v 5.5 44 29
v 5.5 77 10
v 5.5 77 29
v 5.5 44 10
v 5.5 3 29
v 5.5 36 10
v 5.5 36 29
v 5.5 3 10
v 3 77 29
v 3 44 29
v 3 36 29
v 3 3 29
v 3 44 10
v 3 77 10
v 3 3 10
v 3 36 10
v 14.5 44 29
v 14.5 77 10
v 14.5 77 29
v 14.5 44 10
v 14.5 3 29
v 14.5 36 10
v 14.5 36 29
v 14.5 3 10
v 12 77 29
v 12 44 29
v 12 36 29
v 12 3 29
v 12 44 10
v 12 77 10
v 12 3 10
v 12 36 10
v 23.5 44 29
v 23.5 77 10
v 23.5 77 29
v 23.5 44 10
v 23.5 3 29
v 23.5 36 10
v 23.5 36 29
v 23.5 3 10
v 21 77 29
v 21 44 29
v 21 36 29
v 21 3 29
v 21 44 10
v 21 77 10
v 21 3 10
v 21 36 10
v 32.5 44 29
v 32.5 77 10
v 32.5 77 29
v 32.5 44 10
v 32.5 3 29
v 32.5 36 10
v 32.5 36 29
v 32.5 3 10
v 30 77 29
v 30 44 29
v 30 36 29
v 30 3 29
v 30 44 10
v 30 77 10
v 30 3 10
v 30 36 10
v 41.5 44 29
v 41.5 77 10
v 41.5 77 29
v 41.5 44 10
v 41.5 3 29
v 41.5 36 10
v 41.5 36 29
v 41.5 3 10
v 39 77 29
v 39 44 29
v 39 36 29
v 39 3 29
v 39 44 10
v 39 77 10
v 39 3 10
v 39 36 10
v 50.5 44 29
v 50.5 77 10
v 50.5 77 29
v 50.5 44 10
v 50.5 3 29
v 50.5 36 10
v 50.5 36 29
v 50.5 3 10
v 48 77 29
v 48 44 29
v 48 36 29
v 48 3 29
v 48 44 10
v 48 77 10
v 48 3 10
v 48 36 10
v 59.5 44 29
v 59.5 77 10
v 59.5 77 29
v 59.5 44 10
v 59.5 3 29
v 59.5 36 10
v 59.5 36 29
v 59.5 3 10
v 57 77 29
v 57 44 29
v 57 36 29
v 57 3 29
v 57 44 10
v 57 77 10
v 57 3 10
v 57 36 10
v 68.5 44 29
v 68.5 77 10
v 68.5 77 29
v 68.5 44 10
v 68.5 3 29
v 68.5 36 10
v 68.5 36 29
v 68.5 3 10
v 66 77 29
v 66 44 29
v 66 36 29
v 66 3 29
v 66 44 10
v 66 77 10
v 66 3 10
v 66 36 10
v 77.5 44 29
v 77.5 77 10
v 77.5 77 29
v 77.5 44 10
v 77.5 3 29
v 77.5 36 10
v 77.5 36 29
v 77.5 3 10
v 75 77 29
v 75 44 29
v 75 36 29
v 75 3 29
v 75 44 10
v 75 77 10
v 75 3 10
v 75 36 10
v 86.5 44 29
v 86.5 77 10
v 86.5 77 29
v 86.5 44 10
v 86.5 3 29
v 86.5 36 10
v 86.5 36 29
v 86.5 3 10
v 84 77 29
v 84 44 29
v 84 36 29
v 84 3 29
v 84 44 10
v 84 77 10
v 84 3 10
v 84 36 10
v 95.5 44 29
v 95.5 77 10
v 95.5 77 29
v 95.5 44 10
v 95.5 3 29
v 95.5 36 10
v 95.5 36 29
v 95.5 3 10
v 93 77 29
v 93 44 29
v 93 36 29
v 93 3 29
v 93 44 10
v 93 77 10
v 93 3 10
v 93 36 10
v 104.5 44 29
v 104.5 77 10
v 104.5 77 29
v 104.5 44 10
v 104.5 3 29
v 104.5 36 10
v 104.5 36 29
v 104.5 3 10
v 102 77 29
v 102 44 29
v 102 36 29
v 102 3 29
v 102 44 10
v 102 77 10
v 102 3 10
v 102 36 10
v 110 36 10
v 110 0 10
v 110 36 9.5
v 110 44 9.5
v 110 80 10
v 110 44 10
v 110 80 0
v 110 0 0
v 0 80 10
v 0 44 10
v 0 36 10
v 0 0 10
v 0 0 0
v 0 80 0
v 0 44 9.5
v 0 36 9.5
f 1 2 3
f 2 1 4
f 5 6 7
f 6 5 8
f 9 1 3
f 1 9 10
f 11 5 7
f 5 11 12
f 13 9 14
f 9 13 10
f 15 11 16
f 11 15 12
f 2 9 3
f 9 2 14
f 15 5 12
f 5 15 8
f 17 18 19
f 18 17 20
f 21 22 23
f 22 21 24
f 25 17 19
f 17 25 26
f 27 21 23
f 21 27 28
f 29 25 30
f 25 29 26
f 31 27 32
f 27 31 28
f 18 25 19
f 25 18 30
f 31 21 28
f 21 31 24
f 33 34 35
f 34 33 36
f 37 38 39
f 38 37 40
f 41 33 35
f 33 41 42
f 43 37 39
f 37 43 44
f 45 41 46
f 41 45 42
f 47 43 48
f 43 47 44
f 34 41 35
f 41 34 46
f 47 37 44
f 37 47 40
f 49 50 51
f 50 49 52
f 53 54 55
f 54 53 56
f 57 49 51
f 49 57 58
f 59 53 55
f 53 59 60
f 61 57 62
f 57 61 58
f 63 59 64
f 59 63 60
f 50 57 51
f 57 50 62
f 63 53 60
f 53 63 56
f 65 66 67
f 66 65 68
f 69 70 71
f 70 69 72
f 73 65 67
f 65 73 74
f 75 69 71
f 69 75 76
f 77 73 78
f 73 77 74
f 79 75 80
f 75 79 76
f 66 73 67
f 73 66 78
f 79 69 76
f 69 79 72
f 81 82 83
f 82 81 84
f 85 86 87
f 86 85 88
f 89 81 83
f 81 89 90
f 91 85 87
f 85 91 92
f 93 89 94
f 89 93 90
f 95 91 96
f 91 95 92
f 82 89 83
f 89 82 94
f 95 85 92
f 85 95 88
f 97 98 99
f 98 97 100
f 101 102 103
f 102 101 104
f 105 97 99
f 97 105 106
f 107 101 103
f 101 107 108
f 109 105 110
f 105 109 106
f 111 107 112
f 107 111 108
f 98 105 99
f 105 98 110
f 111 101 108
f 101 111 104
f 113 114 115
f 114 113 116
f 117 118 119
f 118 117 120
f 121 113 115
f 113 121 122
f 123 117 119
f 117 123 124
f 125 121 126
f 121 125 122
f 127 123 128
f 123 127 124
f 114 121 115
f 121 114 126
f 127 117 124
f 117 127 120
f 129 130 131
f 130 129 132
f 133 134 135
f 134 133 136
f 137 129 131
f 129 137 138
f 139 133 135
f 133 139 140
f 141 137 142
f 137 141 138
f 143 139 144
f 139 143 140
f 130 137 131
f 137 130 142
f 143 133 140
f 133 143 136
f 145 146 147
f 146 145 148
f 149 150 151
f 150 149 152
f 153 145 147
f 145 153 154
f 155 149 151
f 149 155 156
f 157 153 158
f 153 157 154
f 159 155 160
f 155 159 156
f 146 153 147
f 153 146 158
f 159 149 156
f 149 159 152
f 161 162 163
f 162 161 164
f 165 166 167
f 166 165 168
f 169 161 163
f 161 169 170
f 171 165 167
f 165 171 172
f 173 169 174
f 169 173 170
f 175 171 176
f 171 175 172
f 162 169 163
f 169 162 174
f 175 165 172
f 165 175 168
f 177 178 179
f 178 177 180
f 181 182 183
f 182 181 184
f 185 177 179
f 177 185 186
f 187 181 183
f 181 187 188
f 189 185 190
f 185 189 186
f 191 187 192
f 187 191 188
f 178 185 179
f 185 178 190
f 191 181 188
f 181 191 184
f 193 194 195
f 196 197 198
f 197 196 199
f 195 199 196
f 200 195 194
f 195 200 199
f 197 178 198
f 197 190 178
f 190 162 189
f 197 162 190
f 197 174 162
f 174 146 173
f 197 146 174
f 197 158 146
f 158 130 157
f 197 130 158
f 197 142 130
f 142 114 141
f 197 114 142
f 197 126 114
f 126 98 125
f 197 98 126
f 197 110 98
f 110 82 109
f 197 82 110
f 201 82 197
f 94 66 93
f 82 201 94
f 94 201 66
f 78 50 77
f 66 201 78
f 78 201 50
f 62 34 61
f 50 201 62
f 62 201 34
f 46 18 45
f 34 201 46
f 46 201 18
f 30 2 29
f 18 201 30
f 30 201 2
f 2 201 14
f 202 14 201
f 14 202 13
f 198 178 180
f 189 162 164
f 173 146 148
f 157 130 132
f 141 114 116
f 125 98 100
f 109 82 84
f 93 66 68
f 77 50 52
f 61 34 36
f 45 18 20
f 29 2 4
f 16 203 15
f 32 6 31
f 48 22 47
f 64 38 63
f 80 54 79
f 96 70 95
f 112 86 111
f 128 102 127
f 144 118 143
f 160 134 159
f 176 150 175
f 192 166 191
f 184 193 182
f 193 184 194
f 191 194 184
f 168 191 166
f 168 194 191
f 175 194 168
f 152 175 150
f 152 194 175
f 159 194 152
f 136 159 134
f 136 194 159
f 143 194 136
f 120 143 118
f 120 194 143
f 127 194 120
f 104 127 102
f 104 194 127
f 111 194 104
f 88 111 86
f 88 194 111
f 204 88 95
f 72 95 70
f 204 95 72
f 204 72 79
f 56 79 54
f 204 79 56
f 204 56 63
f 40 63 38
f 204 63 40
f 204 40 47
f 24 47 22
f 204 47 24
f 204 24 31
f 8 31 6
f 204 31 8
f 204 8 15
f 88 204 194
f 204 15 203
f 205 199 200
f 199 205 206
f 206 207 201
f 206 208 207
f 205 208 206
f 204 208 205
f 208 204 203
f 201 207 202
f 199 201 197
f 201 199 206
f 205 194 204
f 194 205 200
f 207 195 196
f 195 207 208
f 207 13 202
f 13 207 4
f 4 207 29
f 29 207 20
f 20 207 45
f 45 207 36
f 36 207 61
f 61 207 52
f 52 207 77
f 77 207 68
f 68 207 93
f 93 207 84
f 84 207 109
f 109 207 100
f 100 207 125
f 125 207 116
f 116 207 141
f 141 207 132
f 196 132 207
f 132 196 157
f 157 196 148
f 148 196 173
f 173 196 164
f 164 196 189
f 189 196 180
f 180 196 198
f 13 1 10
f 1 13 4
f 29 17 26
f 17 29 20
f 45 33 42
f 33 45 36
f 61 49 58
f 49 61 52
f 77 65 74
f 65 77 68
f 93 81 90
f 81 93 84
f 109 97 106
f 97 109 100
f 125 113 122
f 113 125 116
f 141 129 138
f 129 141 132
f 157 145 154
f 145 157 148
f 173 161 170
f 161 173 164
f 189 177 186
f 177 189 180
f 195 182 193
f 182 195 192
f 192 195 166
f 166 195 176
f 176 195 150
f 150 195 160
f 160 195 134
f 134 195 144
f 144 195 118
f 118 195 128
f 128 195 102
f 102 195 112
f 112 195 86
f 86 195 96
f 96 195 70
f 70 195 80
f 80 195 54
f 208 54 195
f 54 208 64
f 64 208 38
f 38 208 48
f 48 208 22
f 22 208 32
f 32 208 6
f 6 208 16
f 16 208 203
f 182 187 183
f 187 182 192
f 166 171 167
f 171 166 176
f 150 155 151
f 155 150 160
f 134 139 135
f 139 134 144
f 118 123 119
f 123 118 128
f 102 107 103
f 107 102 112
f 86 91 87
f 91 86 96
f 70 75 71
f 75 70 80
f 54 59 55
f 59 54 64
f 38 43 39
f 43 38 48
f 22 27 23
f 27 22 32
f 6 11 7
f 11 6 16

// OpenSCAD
$fn = 32;

// ----------------------------------------------------------------------
// Heatsink: slotted fin block
// ----------------------------------------------------------------------

// --- parameters (mm) ---
base_l = 110;             // base length, X
base_w = 80;              // base width, Y
base_t = 10;              // base plate thickness
fin_h = 20;               // fin height above the base
fin_t = 2.5;              // fin thickness
edge = 3;                 // margin from the base ends
pitch = 9;                // fin pitch
slot_w = 8;               // central slot width, Y

n_fins = floor((base_l - 2 * edge - fin_t) / pitch) + 1;  // fin count
total_h = base_t + fin_h - 1;  // overall height

difference() {
union() {
  cube([base_l, base_w, base_t]);
  for (i = [0 : n_fins - 1])
    translate([edge + i * pitch, edge, base_t - 1])
      cube([fin_t, base_w - 2 * edge, fin_h]);
}
  translate([-1, base_w / 2 - slot_w / 2, base_t - 0.5])
    cube([base_l + 2, slot_w, fin_h + 2]);
}
